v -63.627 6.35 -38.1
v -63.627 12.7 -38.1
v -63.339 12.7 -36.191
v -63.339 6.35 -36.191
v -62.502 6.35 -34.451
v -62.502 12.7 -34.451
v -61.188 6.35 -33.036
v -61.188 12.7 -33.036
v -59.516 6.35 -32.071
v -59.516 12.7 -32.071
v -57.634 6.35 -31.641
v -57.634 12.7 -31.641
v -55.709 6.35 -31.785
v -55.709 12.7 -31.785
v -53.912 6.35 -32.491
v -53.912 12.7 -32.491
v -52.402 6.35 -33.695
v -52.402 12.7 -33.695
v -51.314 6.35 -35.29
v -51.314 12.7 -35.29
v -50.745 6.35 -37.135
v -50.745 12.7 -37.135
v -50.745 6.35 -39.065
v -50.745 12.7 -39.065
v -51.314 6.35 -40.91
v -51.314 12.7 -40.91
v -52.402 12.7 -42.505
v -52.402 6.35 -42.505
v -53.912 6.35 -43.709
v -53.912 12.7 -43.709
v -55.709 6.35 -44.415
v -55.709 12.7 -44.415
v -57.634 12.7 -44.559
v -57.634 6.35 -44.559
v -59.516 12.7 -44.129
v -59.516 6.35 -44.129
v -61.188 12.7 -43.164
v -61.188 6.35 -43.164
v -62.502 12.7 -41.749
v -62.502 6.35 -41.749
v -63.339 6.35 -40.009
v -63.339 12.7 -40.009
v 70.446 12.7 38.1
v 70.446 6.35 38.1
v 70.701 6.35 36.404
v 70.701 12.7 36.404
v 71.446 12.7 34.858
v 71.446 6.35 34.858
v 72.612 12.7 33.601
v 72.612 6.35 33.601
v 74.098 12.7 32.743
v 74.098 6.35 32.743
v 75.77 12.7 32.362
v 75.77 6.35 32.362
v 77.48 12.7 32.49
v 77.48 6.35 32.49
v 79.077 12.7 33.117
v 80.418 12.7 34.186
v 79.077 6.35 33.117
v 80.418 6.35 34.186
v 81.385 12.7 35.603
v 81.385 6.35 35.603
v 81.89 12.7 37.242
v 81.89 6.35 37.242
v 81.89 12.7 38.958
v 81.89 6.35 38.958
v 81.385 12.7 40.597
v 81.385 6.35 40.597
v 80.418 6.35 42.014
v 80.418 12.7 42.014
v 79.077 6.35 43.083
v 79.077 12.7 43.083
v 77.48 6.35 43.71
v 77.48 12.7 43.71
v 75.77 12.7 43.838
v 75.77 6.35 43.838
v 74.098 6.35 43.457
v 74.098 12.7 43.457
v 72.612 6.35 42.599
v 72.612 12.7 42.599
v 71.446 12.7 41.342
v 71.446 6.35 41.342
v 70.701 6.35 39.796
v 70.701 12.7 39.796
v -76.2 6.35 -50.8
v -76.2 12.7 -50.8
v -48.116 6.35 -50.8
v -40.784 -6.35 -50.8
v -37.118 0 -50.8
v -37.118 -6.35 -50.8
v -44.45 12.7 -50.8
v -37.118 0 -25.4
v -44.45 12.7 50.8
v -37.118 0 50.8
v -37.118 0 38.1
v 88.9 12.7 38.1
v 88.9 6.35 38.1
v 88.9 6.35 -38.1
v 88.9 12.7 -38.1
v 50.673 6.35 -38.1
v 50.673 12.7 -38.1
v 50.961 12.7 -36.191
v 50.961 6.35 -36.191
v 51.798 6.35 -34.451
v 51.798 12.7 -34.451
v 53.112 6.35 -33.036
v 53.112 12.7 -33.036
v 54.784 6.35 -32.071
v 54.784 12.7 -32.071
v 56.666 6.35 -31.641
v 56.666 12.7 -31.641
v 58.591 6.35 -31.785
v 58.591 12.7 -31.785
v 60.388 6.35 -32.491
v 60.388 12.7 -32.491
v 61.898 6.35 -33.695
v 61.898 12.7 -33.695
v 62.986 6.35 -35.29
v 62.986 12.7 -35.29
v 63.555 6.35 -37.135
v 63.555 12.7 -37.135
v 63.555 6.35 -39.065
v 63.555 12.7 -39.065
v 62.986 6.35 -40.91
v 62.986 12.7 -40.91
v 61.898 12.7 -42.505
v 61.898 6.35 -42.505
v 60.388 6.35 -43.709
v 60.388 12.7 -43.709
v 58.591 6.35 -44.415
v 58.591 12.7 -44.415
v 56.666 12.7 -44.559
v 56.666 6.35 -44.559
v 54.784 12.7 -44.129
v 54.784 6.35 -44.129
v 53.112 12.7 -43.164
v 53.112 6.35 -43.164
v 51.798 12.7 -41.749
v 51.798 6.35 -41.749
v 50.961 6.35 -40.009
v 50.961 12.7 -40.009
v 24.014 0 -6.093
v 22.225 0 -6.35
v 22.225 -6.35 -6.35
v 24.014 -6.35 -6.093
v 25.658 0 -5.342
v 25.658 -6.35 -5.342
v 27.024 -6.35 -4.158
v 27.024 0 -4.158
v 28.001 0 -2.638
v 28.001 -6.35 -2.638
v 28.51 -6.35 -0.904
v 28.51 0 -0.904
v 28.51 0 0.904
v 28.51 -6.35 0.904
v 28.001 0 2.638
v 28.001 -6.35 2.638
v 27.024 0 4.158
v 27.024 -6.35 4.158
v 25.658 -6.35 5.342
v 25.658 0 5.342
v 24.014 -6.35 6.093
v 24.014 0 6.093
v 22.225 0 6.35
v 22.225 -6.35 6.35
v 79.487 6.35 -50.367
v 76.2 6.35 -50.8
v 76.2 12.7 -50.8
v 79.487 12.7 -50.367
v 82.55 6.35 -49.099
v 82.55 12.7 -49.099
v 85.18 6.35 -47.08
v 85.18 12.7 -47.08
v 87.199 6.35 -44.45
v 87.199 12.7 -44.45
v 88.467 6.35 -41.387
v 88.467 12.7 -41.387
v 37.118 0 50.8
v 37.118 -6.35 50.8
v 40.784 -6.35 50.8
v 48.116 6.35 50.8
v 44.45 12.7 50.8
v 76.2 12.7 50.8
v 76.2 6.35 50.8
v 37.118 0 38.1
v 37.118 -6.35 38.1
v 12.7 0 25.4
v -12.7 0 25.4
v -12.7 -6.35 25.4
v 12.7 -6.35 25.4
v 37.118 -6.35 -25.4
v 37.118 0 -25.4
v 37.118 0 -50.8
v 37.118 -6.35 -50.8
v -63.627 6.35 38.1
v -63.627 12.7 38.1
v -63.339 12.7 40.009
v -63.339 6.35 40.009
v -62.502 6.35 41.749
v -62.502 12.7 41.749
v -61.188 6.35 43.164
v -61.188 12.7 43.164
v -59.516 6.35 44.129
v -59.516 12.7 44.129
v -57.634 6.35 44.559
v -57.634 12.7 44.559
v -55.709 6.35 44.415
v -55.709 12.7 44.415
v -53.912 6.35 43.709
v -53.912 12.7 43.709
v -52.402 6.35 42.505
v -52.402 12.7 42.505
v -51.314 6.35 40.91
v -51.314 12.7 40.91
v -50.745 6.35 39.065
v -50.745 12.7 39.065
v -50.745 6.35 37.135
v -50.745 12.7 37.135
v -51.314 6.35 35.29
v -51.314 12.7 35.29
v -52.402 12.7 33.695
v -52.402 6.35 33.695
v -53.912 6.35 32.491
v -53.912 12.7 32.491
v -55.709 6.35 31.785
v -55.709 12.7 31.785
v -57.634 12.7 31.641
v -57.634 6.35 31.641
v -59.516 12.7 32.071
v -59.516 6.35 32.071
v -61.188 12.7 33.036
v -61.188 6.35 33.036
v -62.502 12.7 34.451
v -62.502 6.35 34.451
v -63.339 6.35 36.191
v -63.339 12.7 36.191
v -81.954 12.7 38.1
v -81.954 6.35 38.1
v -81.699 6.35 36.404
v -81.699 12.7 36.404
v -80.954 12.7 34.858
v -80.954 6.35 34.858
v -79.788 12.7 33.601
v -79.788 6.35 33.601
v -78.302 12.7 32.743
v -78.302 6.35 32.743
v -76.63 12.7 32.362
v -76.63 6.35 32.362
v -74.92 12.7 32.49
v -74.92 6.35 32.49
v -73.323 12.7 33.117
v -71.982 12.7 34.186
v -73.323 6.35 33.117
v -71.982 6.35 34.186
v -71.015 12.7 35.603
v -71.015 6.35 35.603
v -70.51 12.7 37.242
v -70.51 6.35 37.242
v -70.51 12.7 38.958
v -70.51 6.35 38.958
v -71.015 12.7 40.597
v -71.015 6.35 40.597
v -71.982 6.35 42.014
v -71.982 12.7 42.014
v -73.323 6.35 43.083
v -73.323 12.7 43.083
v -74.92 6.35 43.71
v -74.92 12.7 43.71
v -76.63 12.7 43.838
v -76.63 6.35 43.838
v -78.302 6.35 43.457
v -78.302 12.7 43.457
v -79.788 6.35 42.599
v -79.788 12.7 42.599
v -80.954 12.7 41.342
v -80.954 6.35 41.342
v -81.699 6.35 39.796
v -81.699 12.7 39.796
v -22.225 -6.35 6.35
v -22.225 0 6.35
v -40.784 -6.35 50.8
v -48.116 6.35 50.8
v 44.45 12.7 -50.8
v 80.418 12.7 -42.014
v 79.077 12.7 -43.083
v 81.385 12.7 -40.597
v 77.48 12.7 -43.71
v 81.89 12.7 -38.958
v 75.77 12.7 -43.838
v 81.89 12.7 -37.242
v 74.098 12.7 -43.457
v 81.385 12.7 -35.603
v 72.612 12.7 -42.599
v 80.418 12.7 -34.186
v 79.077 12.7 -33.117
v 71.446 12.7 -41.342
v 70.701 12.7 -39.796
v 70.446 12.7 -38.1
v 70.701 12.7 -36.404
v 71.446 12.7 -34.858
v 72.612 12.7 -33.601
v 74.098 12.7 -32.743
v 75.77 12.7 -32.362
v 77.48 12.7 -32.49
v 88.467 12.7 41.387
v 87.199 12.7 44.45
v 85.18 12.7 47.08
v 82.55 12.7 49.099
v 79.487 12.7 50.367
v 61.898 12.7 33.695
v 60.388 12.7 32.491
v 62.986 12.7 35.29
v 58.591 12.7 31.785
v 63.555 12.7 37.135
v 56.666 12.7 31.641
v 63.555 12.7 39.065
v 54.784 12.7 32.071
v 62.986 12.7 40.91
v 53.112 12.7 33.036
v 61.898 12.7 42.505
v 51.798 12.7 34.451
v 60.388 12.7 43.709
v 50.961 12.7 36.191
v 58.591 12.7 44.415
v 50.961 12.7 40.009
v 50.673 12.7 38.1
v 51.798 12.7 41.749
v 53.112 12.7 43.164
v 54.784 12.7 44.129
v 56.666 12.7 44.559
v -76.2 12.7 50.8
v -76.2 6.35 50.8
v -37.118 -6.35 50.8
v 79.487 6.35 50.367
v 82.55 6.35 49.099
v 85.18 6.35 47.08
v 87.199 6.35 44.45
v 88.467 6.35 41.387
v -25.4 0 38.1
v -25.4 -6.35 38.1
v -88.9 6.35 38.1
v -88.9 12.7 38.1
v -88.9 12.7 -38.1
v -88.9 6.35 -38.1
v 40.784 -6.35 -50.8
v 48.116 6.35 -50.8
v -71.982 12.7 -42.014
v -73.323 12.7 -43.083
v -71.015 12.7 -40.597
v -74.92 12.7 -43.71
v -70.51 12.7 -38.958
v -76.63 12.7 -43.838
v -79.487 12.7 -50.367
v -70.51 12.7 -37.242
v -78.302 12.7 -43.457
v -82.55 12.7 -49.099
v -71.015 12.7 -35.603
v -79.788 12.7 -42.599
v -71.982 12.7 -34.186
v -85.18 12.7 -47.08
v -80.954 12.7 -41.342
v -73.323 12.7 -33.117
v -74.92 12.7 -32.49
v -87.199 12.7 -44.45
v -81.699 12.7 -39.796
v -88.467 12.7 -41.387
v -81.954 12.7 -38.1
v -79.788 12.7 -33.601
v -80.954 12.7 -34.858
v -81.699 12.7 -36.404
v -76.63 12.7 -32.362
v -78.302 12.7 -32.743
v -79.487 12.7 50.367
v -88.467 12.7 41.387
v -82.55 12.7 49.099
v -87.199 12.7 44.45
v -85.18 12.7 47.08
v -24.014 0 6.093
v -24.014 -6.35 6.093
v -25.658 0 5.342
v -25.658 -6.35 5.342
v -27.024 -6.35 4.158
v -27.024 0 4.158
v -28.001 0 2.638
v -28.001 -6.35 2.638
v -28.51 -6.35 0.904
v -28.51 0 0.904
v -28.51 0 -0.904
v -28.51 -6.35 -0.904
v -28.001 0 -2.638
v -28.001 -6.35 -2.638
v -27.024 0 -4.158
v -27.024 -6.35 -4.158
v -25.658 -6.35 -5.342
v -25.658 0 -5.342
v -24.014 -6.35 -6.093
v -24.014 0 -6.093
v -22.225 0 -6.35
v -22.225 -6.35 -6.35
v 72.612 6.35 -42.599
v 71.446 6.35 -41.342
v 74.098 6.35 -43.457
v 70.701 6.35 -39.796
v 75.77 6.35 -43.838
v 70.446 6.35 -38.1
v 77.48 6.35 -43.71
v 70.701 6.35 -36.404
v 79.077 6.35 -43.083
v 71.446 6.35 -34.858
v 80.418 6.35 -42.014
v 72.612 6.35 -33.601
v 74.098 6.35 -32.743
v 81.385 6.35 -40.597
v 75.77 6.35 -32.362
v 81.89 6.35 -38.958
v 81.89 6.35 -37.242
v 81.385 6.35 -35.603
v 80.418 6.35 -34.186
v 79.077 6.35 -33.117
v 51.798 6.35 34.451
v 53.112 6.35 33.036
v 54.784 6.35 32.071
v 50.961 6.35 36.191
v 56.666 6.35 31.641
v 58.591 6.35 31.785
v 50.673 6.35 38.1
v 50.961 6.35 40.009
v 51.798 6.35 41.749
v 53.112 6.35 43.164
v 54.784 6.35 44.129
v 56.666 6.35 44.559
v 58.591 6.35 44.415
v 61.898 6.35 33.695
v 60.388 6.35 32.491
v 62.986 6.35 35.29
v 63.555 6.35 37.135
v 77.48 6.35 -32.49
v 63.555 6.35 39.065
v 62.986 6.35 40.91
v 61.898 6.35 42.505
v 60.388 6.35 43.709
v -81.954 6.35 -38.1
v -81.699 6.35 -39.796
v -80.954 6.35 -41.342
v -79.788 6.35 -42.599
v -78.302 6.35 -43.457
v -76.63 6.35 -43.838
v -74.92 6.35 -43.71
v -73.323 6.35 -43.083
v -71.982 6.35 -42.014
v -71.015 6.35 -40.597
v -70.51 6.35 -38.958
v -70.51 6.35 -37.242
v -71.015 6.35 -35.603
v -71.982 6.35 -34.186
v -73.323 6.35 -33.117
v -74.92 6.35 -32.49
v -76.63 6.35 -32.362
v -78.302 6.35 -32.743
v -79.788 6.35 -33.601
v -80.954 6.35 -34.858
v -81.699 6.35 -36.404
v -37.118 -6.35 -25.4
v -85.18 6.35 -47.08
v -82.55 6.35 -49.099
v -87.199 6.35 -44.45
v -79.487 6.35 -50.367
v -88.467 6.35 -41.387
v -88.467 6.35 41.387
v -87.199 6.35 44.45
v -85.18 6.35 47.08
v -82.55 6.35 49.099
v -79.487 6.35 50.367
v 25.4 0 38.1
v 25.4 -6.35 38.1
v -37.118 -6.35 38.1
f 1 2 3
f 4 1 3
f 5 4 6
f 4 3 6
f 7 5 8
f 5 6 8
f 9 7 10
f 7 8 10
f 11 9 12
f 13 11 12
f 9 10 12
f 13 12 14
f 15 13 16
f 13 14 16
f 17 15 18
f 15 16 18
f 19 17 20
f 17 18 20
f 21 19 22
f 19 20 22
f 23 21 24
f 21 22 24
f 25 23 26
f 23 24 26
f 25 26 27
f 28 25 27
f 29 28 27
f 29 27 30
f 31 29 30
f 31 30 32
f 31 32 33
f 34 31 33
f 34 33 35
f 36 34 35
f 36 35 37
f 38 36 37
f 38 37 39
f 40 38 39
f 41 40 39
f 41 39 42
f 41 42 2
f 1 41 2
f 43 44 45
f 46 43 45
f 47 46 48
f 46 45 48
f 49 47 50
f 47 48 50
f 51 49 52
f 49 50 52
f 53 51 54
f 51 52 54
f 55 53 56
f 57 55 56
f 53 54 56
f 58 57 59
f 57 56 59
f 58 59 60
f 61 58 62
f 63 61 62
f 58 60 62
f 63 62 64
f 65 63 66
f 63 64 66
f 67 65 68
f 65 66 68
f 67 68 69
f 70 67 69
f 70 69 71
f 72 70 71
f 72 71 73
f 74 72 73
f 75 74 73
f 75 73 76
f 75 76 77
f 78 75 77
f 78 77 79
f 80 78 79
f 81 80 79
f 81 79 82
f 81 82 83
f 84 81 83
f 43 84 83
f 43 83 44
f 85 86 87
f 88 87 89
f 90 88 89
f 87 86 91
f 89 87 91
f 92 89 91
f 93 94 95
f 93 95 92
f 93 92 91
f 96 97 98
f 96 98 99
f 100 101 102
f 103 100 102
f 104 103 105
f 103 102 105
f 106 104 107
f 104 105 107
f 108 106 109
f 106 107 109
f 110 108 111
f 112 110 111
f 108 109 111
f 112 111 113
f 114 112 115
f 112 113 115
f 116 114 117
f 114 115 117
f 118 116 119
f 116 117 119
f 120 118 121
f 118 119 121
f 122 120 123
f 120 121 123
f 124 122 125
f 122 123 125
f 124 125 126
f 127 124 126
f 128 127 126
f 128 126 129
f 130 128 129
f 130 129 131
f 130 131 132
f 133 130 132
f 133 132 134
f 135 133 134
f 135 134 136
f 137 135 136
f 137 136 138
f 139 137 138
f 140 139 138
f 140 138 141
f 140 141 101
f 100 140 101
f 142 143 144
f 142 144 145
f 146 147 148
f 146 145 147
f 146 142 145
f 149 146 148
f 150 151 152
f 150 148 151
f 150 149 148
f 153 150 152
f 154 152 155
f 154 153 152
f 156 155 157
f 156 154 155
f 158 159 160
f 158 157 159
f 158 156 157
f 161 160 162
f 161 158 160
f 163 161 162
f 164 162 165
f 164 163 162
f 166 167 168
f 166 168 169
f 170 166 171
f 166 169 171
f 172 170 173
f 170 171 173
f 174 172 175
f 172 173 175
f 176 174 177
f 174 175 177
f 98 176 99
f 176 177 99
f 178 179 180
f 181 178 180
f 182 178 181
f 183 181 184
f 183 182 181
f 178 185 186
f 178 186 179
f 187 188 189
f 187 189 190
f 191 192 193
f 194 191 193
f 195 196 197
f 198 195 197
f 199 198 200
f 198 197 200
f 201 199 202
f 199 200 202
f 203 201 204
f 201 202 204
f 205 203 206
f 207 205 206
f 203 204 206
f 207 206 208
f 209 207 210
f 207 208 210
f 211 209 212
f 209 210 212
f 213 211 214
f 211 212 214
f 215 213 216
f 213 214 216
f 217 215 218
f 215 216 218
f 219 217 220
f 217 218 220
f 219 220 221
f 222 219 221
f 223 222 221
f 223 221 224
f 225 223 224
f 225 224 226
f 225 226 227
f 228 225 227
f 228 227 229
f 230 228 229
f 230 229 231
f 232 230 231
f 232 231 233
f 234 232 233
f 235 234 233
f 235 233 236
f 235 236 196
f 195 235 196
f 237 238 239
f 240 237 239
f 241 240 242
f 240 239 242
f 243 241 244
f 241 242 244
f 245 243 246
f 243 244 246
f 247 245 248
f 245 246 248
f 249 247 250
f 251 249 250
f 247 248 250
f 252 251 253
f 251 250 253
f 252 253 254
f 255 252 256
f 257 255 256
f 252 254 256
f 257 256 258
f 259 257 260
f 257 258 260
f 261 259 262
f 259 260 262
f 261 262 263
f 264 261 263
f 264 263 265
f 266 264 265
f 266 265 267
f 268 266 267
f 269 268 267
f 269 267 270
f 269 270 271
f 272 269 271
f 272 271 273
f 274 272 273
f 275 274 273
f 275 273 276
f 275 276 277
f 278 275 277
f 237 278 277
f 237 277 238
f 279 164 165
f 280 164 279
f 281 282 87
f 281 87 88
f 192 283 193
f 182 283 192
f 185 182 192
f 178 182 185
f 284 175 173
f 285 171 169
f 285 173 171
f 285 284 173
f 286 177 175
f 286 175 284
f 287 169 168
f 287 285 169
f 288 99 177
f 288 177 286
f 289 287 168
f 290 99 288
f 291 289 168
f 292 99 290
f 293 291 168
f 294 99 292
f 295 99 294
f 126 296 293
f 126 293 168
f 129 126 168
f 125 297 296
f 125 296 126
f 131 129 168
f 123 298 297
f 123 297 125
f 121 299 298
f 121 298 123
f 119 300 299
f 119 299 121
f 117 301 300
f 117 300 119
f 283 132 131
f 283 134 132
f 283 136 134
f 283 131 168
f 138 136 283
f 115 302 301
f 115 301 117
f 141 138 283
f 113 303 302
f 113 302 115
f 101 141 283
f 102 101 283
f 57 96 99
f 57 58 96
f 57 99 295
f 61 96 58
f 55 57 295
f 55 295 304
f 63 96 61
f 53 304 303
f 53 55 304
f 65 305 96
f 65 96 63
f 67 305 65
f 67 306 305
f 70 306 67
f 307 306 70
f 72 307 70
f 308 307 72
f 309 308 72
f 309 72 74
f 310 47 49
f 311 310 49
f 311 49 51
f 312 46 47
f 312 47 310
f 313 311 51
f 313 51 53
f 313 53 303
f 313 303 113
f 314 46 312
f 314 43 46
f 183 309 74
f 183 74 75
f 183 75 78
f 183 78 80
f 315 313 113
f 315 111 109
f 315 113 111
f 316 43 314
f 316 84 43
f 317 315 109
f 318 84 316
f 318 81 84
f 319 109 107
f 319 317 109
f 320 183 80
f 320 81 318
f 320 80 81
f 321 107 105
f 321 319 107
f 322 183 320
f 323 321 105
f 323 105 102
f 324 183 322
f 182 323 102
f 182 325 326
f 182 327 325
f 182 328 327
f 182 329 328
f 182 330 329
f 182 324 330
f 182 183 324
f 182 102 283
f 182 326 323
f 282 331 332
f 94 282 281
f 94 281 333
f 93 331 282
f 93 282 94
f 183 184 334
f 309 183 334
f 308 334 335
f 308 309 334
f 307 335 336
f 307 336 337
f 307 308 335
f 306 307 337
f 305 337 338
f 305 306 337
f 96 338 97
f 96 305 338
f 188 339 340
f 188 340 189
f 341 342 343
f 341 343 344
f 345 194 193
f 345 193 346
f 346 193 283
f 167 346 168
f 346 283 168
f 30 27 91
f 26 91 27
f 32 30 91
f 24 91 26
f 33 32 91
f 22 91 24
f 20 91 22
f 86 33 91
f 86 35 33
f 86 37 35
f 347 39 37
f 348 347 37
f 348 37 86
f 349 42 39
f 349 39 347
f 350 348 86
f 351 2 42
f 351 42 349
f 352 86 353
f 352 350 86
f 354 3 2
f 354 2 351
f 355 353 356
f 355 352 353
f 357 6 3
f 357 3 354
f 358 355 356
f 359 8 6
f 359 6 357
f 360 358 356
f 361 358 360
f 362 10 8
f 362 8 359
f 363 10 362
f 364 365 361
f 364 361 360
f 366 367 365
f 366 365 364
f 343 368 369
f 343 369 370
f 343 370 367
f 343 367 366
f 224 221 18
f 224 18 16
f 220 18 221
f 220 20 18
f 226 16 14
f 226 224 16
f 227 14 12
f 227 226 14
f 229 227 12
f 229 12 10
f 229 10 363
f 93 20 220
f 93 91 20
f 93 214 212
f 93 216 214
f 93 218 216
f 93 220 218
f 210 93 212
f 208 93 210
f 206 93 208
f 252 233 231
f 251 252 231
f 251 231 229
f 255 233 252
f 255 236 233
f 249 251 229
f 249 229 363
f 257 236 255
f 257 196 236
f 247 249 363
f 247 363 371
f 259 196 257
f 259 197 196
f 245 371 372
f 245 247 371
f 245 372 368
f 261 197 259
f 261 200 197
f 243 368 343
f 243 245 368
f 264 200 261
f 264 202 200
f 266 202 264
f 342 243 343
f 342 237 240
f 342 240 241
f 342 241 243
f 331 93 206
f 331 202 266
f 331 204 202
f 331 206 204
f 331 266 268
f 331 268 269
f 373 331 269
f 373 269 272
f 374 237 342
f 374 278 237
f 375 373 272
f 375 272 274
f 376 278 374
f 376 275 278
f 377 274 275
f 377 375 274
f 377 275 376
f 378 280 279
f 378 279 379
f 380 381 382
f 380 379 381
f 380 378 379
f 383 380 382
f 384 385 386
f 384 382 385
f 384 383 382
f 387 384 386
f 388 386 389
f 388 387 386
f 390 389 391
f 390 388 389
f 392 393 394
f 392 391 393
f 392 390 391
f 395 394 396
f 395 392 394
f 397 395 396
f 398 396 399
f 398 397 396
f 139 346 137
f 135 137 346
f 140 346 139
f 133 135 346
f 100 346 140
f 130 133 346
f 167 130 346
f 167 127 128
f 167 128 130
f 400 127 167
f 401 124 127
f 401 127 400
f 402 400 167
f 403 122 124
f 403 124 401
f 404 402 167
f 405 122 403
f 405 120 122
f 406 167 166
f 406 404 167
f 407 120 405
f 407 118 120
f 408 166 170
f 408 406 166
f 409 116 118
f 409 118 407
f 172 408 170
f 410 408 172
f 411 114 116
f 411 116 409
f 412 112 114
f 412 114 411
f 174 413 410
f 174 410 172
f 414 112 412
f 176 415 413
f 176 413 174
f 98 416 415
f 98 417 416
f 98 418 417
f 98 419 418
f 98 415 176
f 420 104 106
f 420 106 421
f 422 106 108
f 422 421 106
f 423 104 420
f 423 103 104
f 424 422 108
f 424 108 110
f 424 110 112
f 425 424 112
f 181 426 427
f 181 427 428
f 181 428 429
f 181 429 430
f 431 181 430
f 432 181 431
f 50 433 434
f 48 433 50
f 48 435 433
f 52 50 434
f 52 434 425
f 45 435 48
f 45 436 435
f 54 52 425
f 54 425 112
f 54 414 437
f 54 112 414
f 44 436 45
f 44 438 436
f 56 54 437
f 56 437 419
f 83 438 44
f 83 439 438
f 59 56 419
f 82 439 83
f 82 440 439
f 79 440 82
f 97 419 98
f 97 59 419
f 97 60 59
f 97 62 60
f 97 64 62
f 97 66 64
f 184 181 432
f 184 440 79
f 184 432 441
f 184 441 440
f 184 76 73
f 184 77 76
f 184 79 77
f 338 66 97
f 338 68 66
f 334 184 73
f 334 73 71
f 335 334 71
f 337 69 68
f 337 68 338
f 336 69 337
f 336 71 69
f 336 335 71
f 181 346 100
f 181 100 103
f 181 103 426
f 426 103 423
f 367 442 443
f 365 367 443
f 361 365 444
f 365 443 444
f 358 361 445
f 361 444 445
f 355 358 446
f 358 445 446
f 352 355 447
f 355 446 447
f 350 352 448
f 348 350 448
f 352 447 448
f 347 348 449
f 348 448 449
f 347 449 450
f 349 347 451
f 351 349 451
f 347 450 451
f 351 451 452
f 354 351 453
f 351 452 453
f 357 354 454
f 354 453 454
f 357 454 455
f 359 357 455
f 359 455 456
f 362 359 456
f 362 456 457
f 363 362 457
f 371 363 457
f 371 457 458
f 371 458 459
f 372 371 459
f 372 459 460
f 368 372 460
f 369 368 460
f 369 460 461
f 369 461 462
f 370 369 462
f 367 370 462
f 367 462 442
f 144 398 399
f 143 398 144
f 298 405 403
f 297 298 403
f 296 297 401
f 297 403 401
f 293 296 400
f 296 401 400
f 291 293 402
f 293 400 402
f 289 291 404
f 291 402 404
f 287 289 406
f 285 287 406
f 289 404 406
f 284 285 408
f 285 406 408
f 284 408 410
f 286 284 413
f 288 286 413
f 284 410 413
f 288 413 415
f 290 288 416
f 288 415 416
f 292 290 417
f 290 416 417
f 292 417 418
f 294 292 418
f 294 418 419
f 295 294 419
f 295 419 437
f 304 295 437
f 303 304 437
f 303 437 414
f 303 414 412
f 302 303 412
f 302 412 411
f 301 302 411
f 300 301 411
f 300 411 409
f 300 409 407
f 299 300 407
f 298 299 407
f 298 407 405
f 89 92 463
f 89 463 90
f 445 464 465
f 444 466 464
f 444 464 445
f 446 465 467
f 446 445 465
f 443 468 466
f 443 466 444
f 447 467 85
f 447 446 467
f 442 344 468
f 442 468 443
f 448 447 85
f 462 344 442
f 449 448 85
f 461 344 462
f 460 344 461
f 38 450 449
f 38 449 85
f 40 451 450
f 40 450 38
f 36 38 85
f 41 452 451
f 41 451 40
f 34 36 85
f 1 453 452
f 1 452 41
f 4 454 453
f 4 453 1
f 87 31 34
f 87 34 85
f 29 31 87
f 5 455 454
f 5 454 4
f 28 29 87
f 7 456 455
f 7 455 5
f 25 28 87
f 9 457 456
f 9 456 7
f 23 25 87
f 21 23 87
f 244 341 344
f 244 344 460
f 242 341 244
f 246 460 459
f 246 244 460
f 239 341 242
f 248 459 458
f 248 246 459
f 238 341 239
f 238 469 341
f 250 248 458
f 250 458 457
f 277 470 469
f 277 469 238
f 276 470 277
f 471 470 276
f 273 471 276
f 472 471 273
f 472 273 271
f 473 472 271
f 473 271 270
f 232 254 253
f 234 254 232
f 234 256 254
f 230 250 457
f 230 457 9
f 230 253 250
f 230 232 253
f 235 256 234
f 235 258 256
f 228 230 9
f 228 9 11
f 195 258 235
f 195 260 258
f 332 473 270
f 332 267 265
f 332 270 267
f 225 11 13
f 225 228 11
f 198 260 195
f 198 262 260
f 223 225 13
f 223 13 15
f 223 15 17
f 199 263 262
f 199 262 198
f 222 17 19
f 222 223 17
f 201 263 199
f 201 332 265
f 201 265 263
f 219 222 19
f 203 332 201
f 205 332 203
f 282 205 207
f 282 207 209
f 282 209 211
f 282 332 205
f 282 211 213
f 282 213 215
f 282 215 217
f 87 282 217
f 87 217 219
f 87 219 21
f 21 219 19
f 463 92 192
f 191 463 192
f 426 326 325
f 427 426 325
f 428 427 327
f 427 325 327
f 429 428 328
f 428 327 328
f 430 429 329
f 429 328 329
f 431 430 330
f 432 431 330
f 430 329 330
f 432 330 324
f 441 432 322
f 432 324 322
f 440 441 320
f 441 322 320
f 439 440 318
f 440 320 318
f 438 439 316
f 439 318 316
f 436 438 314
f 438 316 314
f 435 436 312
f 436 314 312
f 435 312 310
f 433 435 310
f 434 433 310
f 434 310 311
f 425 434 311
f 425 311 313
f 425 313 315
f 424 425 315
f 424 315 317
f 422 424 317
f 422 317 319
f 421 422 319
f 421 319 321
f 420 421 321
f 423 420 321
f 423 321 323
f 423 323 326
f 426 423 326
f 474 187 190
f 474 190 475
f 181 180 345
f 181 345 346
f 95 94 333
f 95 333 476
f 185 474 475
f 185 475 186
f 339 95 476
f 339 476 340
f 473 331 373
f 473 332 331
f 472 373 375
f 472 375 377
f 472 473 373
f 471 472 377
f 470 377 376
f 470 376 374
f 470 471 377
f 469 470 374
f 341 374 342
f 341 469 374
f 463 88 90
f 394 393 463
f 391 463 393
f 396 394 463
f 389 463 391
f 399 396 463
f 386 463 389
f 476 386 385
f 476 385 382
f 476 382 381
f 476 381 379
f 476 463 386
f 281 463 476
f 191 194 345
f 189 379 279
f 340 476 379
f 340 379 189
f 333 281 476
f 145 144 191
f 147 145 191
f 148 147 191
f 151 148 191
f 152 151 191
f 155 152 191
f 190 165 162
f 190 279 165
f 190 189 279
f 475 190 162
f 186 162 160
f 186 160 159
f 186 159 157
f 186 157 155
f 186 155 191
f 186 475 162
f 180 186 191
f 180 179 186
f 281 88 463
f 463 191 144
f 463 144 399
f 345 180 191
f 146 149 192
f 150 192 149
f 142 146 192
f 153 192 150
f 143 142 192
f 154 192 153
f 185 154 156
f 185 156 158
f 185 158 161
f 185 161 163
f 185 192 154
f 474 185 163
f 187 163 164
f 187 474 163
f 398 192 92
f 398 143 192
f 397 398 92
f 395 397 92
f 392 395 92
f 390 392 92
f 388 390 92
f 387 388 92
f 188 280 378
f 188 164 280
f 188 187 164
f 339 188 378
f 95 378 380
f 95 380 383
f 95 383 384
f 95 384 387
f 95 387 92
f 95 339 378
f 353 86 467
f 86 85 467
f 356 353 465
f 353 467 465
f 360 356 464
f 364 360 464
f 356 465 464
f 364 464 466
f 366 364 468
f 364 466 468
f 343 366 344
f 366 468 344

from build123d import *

# Parameters (mm, degrees)
BOSS_EXTRUDE1_DEPTH     = 50.8
SKETCH2_W               = 74.235303162
SKETCH2_H               = 25.4
CUT_EXTRUDE1_DEPTH      = 104.175287739
FILLET2_R               = 12.7
SKETCH4_R               = 6.477
CUT_EXTRUDE2_DEPTH      = 105.147743615
F_1_2_20_TAPPED_HOLE1_D = 11.50874


with BuildPart() as part:
    # Sketch1 → Boss-Extrude1 (new, symmetric)
    with BuildSketch(Plane.XY):
        Polygon((0, 0), (-37.117651581, 0), (-44.45, 12.7), (-88.9, 12.7), (-88.9, 6.35), (-48.116174209, 6.35), (-40.783825791, -6.35), (40.783825791, -6.35), (48.116174209, 6.35), (88.9, 6.35), (88.9, 12.7), (44.45, 12.7), (37.117651581, 0), align=None)
    extrude(amount=BOSS_EXTRUDE1_DEPTH, both=True)

    # Sketch2 → Cut-Extrude1 (cut, through all)
    with BuildSketch(Plane(origin=(0, 0, 0), x_dir=(1, 0, 0), z_dir=(0, 1, 0))):
        with Locations((0, 38.1)):
            Rectangle(SKETCH2_W, SKETCH2_H)
        Polygon((-37.117651581, -38.1), (-25.4, -38.1), (-12.7, -25.4), (12.7, -25.4), (25.4, -38.1), (37.117651581, -38.1), (37.117651581, -50.8), (-37.117651581, -50.8), align=None)
        with BuildLine():
            Line((-22.225, 6.35), (22.225, 6.35))
            ThreePointArc((22.225, 6.35), (28.575, 0), (22.225, -6.35))
            Line((22.225, -6.35), (-22.225, -6.35))
            ThreePointArc((-22.225, -6.35), (-28.575, 0), (-22.225, 6.35))
        make_face()
    extrude(amount=-CUT_EXTRUDE1_DEPTH, mode=Mode.SUBTRACT)

    # Fillet2
    fillet2_edges = [part.edges().sort_by_distance(p)[0] for p in [
        (88.9, 9.525, -50.8),
        (-88.9, 9.525, -50.8),
        (-88.9, 9.525, 50.8),
        (88.9, 9.525, 50.8),
    ]]
    fillet(fillet2_edges, radius=FILLET2_R)

    # Sketch4 → Cut-Extrude2 (cut, through all)
    with BuildSketch(Plane(origin=(0, 12.7, 0), x_dir=(1, 0, 0), z_dir=(0, 1, 0))):
        with Locations(Location((-57.15, 38.1, 0), (0, 0, 180))):
            Circle(SKETCH4_R)
        with Locations(Location((-57.15, -38.1, 0), (0, 0, 180))):
            Circle(SKETCH4_R)
        with Locations(Location((57.15, -38.1, 0), (0, 0, 180))):
            Circle(SKETCH4_R)
        with Locations(Location((57.15, 38.1, 0), (0, 0, 180))):
            Circle(SKETCH4_R)
    extrude(amount=-CUT_EXTRUDE2_DEPTH, mode=Mode.SUBTRACT)

    # 1/2-20 Tapped Hole1 (through all)
    with Locations(Plane(origin=(0, 12.7, 0), x_dir=(1, 0, 0), z_dir=(0, 1, 0))):
        with Locations((-76.2, 38.1), (-76.2, -38.1), (76.2, -38.1), (76.2, 38.1)):
            Hole(F_1_2_20_TAPPED_HOLE1_D / 2)


solid = part.part
